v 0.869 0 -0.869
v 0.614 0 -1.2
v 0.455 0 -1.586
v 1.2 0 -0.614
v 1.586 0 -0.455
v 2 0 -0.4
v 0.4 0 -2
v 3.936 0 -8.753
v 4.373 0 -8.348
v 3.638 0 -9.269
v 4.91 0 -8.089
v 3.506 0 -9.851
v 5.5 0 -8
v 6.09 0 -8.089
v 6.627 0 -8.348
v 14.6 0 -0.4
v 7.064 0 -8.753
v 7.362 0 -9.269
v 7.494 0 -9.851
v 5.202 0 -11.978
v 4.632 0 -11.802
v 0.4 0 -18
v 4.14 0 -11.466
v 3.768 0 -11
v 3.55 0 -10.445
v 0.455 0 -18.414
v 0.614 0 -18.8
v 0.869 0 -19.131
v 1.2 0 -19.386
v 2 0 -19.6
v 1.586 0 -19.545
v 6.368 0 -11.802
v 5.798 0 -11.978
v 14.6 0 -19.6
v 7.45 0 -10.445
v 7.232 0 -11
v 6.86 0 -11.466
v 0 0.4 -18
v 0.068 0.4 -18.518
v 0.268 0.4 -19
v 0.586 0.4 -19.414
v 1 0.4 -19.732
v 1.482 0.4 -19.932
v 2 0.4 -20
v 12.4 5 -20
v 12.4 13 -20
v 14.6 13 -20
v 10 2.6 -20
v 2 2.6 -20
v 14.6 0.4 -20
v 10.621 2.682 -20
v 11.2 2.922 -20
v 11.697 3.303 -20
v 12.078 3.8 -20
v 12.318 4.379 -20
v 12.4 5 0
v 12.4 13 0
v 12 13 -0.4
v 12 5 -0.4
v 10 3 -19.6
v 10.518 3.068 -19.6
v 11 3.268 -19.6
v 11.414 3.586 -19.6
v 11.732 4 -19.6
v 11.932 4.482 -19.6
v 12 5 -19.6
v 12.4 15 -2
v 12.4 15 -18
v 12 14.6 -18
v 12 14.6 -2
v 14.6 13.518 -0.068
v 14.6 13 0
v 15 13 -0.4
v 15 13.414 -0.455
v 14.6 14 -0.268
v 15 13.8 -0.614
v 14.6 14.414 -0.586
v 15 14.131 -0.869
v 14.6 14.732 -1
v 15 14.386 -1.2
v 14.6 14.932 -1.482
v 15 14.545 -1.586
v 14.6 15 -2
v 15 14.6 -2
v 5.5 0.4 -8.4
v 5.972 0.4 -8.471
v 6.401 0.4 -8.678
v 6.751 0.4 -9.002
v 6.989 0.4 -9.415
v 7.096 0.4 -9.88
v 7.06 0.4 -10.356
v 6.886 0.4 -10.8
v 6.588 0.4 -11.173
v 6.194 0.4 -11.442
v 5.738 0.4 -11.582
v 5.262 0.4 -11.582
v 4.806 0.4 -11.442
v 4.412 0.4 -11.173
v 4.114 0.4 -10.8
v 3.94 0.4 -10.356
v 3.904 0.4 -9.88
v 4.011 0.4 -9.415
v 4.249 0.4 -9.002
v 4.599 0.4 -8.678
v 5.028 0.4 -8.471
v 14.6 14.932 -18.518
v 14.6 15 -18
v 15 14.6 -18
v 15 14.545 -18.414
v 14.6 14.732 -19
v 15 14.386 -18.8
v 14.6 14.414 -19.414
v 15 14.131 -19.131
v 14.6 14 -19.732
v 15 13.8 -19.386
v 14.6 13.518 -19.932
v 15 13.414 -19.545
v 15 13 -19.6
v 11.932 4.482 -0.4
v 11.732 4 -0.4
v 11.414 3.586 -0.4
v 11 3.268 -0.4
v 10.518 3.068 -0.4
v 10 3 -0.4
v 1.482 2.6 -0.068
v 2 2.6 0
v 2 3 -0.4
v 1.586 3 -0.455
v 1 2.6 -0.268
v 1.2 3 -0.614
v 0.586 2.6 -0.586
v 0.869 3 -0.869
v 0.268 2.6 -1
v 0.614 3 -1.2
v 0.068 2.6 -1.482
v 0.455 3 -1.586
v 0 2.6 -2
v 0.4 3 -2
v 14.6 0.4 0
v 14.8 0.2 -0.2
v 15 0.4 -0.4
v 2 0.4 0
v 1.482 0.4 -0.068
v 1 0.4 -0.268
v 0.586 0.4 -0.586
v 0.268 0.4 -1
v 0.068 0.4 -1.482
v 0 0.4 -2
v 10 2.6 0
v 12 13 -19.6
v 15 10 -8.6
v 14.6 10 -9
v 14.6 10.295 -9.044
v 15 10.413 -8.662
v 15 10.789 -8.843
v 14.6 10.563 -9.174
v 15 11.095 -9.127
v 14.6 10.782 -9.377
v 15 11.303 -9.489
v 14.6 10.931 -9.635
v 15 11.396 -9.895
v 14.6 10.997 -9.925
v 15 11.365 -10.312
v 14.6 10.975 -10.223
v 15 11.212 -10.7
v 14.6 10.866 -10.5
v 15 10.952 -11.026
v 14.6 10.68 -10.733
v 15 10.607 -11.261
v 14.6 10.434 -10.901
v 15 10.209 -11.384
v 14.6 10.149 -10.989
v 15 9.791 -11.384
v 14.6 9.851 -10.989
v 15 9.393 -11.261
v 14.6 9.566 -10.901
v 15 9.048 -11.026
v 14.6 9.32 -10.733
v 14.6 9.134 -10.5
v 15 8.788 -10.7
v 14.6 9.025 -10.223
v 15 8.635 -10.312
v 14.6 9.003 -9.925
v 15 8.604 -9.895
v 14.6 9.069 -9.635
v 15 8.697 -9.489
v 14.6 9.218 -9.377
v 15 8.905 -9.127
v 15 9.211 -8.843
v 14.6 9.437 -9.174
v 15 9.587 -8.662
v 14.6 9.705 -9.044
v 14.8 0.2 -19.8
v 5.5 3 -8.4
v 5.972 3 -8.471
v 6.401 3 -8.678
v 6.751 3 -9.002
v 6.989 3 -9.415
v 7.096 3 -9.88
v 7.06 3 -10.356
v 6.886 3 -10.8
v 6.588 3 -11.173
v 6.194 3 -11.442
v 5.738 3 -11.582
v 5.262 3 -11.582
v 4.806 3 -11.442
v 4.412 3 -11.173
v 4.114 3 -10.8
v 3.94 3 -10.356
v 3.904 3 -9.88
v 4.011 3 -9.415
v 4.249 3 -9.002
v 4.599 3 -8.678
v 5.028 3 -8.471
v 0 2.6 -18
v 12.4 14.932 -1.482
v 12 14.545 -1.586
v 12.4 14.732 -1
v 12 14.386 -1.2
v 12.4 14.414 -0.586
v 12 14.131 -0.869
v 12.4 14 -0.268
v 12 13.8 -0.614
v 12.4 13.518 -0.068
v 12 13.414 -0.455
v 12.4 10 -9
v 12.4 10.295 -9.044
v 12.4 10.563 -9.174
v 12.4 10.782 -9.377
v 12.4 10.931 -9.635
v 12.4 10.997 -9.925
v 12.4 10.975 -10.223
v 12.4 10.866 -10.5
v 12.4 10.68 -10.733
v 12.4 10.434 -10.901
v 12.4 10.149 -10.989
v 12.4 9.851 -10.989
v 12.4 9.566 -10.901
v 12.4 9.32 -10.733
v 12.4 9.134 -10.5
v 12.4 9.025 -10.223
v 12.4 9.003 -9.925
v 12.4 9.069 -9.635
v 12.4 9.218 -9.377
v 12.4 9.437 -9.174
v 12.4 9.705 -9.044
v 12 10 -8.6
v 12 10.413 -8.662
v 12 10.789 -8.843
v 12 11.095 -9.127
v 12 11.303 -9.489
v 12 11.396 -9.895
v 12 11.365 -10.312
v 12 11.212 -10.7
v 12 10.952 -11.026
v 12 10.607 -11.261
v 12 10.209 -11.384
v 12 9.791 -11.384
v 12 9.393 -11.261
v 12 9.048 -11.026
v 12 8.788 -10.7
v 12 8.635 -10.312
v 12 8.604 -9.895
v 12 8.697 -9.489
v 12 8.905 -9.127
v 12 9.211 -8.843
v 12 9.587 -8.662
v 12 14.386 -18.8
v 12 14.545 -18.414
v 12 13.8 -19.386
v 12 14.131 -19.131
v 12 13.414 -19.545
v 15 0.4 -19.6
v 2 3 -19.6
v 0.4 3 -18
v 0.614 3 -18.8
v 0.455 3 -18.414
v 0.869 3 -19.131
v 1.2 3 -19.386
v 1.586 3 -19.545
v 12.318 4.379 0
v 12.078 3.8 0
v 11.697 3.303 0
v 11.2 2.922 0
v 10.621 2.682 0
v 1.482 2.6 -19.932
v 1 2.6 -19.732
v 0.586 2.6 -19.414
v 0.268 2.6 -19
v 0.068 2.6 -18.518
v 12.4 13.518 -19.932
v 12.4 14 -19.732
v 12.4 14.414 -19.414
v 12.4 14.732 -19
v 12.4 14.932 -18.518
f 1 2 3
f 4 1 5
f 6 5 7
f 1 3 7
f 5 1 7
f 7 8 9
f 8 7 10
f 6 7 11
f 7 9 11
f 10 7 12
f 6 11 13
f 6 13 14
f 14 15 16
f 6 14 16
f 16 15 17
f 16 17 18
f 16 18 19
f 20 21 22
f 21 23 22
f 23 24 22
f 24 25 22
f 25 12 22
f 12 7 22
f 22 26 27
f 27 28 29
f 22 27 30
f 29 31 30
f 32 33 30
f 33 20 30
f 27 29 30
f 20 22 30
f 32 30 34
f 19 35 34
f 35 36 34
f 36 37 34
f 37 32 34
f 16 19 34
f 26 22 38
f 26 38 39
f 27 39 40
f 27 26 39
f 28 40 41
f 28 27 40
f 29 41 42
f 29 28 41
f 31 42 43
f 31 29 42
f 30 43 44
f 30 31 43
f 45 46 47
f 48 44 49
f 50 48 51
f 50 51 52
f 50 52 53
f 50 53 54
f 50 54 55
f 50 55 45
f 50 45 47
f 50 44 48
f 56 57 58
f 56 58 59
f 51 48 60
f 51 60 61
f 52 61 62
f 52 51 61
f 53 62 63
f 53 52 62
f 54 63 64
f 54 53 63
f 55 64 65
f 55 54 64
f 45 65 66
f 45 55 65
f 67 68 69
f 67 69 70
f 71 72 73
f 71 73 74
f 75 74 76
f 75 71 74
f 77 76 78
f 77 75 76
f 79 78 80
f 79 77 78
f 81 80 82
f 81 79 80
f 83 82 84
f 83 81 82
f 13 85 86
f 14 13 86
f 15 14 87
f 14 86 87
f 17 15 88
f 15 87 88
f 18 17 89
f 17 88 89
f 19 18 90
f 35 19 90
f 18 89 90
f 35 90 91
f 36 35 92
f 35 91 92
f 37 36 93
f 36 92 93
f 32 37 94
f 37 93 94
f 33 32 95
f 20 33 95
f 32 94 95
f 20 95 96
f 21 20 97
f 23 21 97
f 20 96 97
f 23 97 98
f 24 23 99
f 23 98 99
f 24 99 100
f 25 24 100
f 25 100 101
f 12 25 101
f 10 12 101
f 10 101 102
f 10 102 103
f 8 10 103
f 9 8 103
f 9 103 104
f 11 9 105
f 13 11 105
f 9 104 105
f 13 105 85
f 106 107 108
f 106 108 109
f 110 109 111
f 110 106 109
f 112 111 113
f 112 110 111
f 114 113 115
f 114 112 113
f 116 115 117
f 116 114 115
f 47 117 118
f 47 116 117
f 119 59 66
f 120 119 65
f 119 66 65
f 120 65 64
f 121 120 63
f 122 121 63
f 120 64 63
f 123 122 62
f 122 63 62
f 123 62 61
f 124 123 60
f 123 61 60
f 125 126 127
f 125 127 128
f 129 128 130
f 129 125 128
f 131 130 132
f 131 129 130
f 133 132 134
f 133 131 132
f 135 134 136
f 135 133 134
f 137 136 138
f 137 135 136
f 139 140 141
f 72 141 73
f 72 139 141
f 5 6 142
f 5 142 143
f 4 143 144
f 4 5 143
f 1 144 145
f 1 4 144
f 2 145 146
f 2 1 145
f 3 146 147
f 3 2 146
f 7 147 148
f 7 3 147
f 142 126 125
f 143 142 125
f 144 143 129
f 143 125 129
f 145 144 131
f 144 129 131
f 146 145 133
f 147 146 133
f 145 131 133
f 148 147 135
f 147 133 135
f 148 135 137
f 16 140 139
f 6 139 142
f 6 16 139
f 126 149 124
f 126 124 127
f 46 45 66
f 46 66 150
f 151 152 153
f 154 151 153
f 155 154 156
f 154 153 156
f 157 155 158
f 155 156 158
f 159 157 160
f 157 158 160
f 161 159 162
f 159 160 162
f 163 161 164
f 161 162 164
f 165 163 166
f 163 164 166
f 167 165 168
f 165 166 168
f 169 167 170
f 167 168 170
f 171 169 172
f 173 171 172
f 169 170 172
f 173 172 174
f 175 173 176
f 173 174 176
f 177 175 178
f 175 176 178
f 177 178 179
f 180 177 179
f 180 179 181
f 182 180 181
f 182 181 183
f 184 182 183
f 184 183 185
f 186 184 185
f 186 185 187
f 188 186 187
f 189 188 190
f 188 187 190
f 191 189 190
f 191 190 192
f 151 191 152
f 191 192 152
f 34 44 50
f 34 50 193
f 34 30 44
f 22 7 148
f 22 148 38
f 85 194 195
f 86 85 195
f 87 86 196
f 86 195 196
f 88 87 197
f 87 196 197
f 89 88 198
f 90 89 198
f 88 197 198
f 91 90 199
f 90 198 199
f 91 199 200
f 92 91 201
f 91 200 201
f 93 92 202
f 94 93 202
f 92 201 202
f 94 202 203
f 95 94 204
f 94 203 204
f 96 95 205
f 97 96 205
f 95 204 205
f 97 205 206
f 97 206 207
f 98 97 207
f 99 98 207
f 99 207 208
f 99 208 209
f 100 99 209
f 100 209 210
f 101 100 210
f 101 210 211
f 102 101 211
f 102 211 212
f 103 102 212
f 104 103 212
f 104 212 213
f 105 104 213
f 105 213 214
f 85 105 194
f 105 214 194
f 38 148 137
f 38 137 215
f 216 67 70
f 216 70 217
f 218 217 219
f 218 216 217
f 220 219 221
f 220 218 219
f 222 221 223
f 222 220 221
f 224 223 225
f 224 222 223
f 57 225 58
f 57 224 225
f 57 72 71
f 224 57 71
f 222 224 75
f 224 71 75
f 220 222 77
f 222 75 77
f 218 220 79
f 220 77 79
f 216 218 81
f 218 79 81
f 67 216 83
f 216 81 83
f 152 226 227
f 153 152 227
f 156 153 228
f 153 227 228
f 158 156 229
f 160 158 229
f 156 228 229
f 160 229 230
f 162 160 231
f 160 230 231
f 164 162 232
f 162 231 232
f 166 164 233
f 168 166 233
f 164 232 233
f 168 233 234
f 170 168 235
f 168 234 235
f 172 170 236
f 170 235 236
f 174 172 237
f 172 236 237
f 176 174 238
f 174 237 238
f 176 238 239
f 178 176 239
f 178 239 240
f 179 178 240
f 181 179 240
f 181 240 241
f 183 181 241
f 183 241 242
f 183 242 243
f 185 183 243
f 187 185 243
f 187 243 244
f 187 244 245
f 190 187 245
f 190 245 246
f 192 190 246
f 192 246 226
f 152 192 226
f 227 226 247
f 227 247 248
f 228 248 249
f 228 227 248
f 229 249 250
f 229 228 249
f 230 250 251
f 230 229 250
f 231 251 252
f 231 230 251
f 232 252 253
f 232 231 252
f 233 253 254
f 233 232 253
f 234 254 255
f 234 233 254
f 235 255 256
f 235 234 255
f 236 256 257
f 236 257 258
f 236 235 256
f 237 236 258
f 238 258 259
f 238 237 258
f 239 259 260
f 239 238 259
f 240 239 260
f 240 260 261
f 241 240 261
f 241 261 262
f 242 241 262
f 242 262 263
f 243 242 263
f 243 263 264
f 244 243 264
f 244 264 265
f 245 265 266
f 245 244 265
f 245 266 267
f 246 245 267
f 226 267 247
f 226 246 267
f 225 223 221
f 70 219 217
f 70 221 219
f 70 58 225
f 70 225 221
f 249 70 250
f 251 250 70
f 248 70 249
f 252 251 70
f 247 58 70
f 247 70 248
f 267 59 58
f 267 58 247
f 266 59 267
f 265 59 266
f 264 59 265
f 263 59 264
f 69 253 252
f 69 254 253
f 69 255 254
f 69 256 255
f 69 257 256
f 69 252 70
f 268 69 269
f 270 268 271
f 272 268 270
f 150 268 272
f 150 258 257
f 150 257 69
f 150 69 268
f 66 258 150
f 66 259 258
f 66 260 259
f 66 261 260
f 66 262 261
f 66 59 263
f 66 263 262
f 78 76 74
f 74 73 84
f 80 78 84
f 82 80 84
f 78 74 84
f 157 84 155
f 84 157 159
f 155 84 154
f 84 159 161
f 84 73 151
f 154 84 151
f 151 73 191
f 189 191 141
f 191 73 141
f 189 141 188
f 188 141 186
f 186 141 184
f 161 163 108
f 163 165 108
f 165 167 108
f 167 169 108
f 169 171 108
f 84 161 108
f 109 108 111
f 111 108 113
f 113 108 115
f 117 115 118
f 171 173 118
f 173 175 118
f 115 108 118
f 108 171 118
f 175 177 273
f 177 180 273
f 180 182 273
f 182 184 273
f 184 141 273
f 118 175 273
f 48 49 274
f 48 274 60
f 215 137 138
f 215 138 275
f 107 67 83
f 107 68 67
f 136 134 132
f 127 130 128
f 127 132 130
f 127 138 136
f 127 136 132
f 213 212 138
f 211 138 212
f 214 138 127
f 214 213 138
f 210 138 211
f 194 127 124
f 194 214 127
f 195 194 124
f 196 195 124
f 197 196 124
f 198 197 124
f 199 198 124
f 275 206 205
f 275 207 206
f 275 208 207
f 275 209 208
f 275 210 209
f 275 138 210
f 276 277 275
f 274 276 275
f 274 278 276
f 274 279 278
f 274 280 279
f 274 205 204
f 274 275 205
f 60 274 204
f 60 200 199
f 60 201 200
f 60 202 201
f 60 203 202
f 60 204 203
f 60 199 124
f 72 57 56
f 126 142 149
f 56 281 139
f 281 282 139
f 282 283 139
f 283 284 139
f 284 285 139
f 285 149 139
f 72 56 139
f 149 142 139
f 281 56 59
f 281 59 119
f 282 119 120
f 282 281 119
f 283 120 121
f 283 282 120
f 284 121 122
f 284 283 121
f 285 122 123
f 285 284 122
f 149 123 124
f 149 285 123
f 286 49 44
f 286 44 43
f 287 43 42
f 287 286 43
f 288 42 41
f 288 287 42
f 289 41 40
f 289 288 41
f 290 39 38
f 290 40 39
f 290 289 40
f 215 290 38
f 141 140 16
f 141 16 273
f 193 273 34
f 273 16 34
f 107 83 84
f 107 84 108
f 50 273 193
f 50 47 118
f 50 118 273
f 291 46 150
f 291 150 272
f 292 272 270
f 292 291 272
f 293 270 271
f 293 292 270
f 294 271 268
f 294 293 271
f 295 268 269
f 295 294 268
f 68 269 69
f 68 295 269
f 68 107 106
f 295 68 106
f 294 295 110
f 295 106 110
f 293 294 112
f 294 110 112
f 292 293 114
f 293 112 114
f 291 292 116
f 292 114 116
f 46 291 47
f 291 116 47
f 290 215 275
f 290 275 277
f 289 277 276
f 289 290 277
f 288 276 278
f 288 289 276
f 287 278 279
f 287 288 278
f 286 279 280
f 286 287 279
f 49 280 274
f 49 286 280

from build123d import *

# Parameters (mm, degrees)
SKETCH_1_W          = 15
SKETCH_1_H          = 20
EXTRUDE_1_DEPTH     = 3
SKETCH_2_R          = 1.6
CUT_EXTRUDE_1_DEPTH = 3
SKETCH_3_W          = 3
SKETCH_3_H          = 20
EXTRUDE_2_DEPTH     = 12
FILLET_1_R          = 2
SKETCH_4_R          = 1
CUT_EXTRUDE_2_DEPTH = 10
FILLET_2_R          = 2
CHAMFER_1_SIZE      = 0.4
CHAMFER_2_SIZE      = 0.4
CHAMFER_3_SIZE      = 0.4


with BuildPart() as part:
    # 草图1 → 凸台-拉伸1 (new body)
    with BuildSketch(Plane(origin=(0, 0, 0), x_dir=(1, 0, 0), z_dir=(0, 1, 0))):
        with Locations((7.5, 10)):
            Rectangle(SKETCH_1_W, SKETCH_1_H)
    extrude(amount=EXTRUDE_1_DEPTH)

    # 草图2 → 切除-拉伸1 (cut)
    with BuildSketch(Plane(origin=(0, 3, 0), x_dir=(1, 0, 0), z_dir=(0, 1, 0))):
        with Locations(Location((5.5, 10, 0), (0, 0, 270))):
            Circle(SKETCH_2_R)
    extrude(amount=-CUT_EXTRUDE_1_DEPTH, mode=Mode.SUBTRACT)

    # 草图3 → 凸台-拉伸2 (add)
    with BuildSketch(Plane(origin=(0, 3, 0), x_dir=(1, 0, 0), z_dir=(0, 1, 0))):
        with Locations((13.5, 10)):
            Rectangle(SKETCH_3_W, SKETCH_3_H)
    extrude(amount=EXTRUDE_2_DEPTH)

    # 圆角1
    fillet_1_edges = [part.edges().sort_by_distance(p)[0] for p in [
        (12, 3, -10),
    ]]
    fillet(fillet_1_edges, radius=FILLET_1_R)

    # 草图4 → 切除-拉伸2 (cut)
    with BuildSketch(Plane.ZY.offset(-12)):
        with Locations((-10, 10)):
            Circle(SKETCH_4_R)
    extrude(amount=-CUT_EXTRUDE_2_DEPTH, mode=Mode.SUBTRACT)

    # 圆角2
    fillet_2_edges = [part.edges().sort_by_distance(p)[0] for p in [
        (13.5, 15, -20),
        (13.5, 15, 0),
        (0, 1.5, -20),
        (0, 1.5, 0),
    ]]
    fillet(fillet_2_edges, radius=FILLET_2_R)

    # 倒角1
    chamfer_1_edges = [part.edges().sort_by_distance(p)[0] for p in [
        (5.5, 0, -11.6),
        (8.5, 0, -20),
        (8.5, 0, 0),
        (15, 0, -10),
        (0, 0, -10),
        (0.585786438, 0, -19.414213562),
        (0.585786438, 0, -0.585786438),
    ]]
    chamfer(chamfer_1_edges, length=CHAMFER_1_SIZE)

    # 倒角2
    chamfer_2_edges = [part.edges().sort_by_distance(p)[0] for p in [
        (15, 15, -10),
        (15, 6.7, -20),
        (15, 6.7, 0),
        (15, 14.414213562, -0.585786438),
        (15, 14.414213562, -19.414213562),
    ]]
    chamfer(chamfer_2_edges, length=CHAMFER_2_SIZE)

    # 倒角3
    chamfer_3_edges = [part.edges().sort_by_distance(p)[0] for p in [
        (6, 3, -20),
        (11.414213562, 3.585786438, 0),
        (11.414213562, 3.585786438, -20),
        (15, 10, -11),
        (12, 10, -11),
        (12, 15, -10),
        (12, 9, -20),
        (12, 9, 0),
        (12, 14.414213562, -0.585786438),
        (12, 14.414213562, -19.414213562),
        (6, 3, 0),
        (0, 3, -10),
        (0.585786438, 3, -19.414213562),
        (0.585786438, 3, -0.585786438),
    ]]
    chamfer(chamfer_3_edges, length=CHAMFER_3_SIZE)


solid = part.part
